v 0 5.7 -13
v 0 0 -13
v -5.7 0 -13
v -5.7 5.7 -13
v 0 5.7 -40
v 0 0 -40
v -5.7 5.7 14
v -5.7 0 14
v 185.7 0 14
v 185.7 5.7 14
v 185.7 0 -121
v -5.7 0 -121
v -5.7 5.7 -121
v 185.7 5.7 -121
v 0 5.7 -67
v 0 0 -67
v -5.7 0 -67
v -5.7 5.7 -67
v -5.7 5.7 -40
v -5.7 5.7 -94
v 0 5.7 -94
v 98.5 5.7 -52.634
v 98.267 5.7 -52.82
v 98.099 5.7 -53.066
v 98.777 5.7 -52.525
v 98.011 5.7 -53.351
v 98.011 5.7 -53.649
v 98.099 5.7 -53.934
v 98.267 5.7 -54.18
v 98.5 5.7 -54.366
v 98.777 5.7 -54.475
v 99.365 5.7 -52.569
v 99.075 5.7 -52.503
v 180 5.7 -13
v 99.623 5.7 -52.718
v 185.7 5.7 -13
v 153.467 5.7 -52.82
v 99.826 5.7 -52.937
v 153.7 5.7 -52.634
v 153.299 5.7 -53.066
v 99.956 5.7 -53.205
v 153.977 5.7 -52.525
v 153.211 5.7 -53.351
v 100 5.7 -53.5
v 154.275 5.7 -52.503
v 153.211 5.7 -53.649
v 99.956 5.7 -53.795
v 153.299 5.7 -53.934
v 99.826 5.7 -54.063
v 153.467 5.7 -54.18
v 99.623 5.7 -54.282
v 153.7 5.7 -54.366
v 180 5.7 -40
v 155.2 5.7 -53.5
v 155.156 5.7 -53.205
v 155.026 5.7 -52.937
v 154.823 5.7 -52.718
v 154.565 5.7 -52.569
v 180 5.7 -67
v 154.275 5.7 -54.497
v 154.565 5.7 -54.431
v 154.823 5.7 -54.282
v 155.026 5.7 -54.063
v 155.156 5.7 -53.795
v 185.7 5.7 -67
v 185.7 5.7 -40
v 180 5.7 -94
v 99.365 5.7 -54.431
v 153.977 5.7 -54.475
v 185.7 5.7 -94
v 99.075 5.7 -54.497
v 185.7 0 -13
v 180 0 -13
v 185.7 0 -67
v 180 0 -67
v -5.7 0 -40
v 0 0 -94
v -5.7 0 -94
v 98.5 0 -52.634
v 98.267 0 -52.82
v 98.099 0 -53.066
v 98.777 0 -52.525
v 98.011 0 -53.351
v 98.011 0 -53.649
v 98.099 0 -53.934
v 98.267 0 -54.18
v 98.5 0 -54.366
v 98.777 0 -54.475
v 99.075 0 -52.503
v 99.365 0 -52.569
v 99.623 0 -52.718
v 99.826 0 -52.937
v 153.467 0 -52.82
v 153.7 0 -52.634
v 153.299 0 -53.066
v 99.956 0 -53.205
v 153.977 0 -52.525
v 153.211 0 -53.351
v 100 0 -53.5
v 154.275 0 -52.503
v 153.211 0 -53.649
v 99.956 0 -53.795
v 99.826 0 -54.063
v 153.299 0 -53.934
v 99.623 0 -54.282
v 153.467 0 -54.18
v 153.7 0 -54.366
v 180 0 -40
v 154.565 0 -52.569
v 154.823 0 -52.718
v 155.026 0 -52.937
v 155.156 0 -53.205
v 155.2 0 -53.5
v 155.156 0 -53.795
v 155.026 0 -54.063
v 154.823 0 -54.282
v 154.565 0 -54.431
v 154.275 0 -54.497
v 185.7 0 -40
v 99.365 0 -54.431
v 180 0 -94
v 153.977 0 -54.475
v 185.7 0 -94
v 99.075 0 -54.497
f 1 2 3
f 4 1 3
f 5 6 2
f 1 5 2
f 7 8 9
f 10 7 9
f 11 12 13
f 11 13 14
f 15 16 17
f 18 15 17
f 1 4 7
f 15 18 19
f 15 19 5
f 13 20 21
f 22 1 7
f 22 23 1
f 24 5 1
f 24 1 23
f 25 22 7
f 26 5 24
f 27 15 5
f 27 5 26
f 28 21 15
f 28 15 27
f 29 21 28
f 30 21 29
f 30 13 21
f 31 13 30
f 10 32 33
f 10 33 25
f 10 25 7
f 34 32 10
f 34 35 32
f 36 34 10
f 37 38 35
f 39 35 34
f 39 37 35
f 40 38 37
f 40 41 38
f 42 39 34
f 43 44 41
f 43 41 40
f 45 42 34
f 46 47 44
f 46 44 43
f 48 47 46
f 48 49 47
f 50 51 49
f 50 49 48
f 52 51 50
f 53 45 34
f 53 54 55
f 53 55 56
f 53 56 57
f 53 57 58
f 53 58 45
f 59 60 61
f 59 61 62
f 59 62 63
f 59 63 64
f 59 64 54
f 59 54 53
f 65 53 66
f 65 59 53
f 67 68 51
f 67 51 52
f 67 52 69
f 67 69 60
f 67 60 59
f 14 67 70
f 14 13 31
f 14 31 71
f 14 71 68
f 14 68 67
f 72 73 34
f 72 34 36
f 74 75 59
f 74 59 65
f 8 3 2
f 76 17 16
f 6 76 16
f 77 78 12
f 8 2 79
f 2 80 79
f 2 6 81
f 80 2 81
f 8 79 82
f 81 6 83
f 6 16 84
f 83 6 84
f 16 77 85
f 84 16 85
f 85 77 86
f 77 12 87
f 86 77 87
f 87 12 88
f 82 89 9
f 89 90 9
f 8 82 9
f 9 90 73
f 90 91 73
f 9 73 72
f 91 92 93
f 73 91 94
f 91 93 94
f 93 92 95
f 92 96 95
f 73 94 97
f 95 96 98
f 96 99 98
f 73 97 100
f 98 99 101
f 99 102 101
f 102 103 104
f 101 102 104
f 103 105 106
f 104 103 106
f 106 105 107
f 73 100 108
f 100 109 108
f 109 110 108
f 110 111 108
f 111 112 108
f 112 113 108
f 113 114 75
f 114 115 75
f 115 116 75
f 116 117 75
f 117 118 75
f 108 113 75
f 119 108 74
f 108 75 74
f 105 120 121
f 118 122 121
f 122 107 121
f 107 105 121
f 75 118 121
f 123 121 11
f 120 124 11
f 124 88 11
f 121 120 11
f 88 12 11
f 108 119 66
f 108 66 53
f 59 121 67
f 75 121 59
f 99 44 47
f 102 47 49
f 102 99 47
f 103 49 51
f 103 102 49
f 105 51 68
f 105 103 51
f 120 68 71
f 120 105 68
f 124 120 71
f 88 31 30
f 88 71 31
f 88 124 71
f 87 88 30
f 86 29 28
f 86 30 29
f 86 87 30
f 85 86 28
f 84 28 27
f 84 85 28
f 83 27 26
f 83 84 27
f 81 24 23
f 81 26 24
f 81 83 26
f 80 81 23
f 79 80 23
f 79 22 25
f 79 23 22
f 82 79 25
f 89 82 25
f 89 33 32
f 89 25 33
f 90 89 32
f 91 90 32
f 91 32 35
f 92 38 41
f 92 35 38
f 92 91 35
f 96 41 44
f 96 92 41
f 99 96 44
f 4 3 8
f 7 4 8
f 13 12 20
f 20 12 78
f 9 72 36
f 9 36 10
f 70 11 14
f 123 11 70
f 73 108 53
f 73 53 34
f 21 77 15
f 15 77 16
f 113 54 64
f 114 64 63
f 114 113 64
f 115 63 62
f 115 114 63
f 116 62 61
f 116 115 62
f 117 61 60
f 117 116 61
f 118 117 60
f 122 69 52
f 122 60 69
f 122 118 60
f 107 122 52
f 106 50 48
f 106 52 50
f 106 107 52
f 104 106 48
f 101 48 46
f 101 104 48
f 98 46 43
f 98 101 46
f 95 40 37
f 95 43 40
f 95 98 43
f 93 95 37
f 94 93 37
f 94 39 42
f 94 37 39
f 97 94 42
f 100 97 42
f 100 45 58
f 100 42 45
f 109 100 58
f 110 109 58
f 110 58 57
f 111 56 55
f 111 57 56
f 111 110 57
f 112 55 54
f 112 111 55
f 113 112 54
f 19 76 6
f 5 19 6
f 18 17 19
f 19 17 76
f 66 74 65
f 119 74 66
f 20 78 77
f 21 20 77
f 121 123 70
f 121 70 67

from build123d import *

# Parameters (mm, degrees)
SKETCH3_W           = 192
SKETCH3_H           = 135
BOSS_EXTRUDE1_DEPTH = 5.7
CUT_EXTRUDE1_DEPTH  = 6
SKETCH11_R          = 1
CUT_EXTRUDE2_DEPTH  = 33


with BuildPart() as part:
    # Sketch3 → Boss-Extrude1 (new body)
    with BuildSketch(Plane(origin=(0, 0, 0), x_dir=(1, 0, 0), z_dir=(0, 1, 0))):
        with Locations((90, 53.5)):
            Rectangle(SKETCH3_W, SKETCH3_H)
    extrude(amount=BOSS_EXTRUDE1_DEPTH)

    # Sketch4 → Cut-Extrude1 (cut)
    with BuildSketch(Plane(origin=(0, 0, 0), x_dir=(1, 0, 0), z_dir=(0, 1, 0))):
        Polygon((-5.7, 121.001666615), (-5.7, 94), (0, 94), (0, 67), (-5.7, 67), (-5.7, 40), (0, 40), (0, 13), (-5.7, 13), (-5.7, -17), (-9.7, -17), (-9.7, 121.001666615), align=None)
        Polygon((189.7, 121.001666615), (185.7, 121.001666615), (185.7, 94), (180, 94), (180, 67), (185.7, 67), (185.7, 40), (180, 40), (180, 13), (185.7, 13), (185.7, -17), (189.7, -17), align=None)
    extrude(amount=CUT_EXTRUDE1_DEPTH, mode=Mode.SUBTRACT)

    # Sketch11 → Cut-Extrude2 (cut)
    with BuildSketch(Plane(origin=(0, 0, 0), x_dir=(1, 0, 0), z_dir=(0, 1, 0))):
        with Locations((99, 53.5)):
            Circle(SKETCH11_R)
        with Locations((154.2, 53.5)):
            Circle(SKETCH11_R)
    extrude(amount=CUT_EXTRUDE2_DEPTH, mode=Mode.SUBTRACT)


solid = part.part
